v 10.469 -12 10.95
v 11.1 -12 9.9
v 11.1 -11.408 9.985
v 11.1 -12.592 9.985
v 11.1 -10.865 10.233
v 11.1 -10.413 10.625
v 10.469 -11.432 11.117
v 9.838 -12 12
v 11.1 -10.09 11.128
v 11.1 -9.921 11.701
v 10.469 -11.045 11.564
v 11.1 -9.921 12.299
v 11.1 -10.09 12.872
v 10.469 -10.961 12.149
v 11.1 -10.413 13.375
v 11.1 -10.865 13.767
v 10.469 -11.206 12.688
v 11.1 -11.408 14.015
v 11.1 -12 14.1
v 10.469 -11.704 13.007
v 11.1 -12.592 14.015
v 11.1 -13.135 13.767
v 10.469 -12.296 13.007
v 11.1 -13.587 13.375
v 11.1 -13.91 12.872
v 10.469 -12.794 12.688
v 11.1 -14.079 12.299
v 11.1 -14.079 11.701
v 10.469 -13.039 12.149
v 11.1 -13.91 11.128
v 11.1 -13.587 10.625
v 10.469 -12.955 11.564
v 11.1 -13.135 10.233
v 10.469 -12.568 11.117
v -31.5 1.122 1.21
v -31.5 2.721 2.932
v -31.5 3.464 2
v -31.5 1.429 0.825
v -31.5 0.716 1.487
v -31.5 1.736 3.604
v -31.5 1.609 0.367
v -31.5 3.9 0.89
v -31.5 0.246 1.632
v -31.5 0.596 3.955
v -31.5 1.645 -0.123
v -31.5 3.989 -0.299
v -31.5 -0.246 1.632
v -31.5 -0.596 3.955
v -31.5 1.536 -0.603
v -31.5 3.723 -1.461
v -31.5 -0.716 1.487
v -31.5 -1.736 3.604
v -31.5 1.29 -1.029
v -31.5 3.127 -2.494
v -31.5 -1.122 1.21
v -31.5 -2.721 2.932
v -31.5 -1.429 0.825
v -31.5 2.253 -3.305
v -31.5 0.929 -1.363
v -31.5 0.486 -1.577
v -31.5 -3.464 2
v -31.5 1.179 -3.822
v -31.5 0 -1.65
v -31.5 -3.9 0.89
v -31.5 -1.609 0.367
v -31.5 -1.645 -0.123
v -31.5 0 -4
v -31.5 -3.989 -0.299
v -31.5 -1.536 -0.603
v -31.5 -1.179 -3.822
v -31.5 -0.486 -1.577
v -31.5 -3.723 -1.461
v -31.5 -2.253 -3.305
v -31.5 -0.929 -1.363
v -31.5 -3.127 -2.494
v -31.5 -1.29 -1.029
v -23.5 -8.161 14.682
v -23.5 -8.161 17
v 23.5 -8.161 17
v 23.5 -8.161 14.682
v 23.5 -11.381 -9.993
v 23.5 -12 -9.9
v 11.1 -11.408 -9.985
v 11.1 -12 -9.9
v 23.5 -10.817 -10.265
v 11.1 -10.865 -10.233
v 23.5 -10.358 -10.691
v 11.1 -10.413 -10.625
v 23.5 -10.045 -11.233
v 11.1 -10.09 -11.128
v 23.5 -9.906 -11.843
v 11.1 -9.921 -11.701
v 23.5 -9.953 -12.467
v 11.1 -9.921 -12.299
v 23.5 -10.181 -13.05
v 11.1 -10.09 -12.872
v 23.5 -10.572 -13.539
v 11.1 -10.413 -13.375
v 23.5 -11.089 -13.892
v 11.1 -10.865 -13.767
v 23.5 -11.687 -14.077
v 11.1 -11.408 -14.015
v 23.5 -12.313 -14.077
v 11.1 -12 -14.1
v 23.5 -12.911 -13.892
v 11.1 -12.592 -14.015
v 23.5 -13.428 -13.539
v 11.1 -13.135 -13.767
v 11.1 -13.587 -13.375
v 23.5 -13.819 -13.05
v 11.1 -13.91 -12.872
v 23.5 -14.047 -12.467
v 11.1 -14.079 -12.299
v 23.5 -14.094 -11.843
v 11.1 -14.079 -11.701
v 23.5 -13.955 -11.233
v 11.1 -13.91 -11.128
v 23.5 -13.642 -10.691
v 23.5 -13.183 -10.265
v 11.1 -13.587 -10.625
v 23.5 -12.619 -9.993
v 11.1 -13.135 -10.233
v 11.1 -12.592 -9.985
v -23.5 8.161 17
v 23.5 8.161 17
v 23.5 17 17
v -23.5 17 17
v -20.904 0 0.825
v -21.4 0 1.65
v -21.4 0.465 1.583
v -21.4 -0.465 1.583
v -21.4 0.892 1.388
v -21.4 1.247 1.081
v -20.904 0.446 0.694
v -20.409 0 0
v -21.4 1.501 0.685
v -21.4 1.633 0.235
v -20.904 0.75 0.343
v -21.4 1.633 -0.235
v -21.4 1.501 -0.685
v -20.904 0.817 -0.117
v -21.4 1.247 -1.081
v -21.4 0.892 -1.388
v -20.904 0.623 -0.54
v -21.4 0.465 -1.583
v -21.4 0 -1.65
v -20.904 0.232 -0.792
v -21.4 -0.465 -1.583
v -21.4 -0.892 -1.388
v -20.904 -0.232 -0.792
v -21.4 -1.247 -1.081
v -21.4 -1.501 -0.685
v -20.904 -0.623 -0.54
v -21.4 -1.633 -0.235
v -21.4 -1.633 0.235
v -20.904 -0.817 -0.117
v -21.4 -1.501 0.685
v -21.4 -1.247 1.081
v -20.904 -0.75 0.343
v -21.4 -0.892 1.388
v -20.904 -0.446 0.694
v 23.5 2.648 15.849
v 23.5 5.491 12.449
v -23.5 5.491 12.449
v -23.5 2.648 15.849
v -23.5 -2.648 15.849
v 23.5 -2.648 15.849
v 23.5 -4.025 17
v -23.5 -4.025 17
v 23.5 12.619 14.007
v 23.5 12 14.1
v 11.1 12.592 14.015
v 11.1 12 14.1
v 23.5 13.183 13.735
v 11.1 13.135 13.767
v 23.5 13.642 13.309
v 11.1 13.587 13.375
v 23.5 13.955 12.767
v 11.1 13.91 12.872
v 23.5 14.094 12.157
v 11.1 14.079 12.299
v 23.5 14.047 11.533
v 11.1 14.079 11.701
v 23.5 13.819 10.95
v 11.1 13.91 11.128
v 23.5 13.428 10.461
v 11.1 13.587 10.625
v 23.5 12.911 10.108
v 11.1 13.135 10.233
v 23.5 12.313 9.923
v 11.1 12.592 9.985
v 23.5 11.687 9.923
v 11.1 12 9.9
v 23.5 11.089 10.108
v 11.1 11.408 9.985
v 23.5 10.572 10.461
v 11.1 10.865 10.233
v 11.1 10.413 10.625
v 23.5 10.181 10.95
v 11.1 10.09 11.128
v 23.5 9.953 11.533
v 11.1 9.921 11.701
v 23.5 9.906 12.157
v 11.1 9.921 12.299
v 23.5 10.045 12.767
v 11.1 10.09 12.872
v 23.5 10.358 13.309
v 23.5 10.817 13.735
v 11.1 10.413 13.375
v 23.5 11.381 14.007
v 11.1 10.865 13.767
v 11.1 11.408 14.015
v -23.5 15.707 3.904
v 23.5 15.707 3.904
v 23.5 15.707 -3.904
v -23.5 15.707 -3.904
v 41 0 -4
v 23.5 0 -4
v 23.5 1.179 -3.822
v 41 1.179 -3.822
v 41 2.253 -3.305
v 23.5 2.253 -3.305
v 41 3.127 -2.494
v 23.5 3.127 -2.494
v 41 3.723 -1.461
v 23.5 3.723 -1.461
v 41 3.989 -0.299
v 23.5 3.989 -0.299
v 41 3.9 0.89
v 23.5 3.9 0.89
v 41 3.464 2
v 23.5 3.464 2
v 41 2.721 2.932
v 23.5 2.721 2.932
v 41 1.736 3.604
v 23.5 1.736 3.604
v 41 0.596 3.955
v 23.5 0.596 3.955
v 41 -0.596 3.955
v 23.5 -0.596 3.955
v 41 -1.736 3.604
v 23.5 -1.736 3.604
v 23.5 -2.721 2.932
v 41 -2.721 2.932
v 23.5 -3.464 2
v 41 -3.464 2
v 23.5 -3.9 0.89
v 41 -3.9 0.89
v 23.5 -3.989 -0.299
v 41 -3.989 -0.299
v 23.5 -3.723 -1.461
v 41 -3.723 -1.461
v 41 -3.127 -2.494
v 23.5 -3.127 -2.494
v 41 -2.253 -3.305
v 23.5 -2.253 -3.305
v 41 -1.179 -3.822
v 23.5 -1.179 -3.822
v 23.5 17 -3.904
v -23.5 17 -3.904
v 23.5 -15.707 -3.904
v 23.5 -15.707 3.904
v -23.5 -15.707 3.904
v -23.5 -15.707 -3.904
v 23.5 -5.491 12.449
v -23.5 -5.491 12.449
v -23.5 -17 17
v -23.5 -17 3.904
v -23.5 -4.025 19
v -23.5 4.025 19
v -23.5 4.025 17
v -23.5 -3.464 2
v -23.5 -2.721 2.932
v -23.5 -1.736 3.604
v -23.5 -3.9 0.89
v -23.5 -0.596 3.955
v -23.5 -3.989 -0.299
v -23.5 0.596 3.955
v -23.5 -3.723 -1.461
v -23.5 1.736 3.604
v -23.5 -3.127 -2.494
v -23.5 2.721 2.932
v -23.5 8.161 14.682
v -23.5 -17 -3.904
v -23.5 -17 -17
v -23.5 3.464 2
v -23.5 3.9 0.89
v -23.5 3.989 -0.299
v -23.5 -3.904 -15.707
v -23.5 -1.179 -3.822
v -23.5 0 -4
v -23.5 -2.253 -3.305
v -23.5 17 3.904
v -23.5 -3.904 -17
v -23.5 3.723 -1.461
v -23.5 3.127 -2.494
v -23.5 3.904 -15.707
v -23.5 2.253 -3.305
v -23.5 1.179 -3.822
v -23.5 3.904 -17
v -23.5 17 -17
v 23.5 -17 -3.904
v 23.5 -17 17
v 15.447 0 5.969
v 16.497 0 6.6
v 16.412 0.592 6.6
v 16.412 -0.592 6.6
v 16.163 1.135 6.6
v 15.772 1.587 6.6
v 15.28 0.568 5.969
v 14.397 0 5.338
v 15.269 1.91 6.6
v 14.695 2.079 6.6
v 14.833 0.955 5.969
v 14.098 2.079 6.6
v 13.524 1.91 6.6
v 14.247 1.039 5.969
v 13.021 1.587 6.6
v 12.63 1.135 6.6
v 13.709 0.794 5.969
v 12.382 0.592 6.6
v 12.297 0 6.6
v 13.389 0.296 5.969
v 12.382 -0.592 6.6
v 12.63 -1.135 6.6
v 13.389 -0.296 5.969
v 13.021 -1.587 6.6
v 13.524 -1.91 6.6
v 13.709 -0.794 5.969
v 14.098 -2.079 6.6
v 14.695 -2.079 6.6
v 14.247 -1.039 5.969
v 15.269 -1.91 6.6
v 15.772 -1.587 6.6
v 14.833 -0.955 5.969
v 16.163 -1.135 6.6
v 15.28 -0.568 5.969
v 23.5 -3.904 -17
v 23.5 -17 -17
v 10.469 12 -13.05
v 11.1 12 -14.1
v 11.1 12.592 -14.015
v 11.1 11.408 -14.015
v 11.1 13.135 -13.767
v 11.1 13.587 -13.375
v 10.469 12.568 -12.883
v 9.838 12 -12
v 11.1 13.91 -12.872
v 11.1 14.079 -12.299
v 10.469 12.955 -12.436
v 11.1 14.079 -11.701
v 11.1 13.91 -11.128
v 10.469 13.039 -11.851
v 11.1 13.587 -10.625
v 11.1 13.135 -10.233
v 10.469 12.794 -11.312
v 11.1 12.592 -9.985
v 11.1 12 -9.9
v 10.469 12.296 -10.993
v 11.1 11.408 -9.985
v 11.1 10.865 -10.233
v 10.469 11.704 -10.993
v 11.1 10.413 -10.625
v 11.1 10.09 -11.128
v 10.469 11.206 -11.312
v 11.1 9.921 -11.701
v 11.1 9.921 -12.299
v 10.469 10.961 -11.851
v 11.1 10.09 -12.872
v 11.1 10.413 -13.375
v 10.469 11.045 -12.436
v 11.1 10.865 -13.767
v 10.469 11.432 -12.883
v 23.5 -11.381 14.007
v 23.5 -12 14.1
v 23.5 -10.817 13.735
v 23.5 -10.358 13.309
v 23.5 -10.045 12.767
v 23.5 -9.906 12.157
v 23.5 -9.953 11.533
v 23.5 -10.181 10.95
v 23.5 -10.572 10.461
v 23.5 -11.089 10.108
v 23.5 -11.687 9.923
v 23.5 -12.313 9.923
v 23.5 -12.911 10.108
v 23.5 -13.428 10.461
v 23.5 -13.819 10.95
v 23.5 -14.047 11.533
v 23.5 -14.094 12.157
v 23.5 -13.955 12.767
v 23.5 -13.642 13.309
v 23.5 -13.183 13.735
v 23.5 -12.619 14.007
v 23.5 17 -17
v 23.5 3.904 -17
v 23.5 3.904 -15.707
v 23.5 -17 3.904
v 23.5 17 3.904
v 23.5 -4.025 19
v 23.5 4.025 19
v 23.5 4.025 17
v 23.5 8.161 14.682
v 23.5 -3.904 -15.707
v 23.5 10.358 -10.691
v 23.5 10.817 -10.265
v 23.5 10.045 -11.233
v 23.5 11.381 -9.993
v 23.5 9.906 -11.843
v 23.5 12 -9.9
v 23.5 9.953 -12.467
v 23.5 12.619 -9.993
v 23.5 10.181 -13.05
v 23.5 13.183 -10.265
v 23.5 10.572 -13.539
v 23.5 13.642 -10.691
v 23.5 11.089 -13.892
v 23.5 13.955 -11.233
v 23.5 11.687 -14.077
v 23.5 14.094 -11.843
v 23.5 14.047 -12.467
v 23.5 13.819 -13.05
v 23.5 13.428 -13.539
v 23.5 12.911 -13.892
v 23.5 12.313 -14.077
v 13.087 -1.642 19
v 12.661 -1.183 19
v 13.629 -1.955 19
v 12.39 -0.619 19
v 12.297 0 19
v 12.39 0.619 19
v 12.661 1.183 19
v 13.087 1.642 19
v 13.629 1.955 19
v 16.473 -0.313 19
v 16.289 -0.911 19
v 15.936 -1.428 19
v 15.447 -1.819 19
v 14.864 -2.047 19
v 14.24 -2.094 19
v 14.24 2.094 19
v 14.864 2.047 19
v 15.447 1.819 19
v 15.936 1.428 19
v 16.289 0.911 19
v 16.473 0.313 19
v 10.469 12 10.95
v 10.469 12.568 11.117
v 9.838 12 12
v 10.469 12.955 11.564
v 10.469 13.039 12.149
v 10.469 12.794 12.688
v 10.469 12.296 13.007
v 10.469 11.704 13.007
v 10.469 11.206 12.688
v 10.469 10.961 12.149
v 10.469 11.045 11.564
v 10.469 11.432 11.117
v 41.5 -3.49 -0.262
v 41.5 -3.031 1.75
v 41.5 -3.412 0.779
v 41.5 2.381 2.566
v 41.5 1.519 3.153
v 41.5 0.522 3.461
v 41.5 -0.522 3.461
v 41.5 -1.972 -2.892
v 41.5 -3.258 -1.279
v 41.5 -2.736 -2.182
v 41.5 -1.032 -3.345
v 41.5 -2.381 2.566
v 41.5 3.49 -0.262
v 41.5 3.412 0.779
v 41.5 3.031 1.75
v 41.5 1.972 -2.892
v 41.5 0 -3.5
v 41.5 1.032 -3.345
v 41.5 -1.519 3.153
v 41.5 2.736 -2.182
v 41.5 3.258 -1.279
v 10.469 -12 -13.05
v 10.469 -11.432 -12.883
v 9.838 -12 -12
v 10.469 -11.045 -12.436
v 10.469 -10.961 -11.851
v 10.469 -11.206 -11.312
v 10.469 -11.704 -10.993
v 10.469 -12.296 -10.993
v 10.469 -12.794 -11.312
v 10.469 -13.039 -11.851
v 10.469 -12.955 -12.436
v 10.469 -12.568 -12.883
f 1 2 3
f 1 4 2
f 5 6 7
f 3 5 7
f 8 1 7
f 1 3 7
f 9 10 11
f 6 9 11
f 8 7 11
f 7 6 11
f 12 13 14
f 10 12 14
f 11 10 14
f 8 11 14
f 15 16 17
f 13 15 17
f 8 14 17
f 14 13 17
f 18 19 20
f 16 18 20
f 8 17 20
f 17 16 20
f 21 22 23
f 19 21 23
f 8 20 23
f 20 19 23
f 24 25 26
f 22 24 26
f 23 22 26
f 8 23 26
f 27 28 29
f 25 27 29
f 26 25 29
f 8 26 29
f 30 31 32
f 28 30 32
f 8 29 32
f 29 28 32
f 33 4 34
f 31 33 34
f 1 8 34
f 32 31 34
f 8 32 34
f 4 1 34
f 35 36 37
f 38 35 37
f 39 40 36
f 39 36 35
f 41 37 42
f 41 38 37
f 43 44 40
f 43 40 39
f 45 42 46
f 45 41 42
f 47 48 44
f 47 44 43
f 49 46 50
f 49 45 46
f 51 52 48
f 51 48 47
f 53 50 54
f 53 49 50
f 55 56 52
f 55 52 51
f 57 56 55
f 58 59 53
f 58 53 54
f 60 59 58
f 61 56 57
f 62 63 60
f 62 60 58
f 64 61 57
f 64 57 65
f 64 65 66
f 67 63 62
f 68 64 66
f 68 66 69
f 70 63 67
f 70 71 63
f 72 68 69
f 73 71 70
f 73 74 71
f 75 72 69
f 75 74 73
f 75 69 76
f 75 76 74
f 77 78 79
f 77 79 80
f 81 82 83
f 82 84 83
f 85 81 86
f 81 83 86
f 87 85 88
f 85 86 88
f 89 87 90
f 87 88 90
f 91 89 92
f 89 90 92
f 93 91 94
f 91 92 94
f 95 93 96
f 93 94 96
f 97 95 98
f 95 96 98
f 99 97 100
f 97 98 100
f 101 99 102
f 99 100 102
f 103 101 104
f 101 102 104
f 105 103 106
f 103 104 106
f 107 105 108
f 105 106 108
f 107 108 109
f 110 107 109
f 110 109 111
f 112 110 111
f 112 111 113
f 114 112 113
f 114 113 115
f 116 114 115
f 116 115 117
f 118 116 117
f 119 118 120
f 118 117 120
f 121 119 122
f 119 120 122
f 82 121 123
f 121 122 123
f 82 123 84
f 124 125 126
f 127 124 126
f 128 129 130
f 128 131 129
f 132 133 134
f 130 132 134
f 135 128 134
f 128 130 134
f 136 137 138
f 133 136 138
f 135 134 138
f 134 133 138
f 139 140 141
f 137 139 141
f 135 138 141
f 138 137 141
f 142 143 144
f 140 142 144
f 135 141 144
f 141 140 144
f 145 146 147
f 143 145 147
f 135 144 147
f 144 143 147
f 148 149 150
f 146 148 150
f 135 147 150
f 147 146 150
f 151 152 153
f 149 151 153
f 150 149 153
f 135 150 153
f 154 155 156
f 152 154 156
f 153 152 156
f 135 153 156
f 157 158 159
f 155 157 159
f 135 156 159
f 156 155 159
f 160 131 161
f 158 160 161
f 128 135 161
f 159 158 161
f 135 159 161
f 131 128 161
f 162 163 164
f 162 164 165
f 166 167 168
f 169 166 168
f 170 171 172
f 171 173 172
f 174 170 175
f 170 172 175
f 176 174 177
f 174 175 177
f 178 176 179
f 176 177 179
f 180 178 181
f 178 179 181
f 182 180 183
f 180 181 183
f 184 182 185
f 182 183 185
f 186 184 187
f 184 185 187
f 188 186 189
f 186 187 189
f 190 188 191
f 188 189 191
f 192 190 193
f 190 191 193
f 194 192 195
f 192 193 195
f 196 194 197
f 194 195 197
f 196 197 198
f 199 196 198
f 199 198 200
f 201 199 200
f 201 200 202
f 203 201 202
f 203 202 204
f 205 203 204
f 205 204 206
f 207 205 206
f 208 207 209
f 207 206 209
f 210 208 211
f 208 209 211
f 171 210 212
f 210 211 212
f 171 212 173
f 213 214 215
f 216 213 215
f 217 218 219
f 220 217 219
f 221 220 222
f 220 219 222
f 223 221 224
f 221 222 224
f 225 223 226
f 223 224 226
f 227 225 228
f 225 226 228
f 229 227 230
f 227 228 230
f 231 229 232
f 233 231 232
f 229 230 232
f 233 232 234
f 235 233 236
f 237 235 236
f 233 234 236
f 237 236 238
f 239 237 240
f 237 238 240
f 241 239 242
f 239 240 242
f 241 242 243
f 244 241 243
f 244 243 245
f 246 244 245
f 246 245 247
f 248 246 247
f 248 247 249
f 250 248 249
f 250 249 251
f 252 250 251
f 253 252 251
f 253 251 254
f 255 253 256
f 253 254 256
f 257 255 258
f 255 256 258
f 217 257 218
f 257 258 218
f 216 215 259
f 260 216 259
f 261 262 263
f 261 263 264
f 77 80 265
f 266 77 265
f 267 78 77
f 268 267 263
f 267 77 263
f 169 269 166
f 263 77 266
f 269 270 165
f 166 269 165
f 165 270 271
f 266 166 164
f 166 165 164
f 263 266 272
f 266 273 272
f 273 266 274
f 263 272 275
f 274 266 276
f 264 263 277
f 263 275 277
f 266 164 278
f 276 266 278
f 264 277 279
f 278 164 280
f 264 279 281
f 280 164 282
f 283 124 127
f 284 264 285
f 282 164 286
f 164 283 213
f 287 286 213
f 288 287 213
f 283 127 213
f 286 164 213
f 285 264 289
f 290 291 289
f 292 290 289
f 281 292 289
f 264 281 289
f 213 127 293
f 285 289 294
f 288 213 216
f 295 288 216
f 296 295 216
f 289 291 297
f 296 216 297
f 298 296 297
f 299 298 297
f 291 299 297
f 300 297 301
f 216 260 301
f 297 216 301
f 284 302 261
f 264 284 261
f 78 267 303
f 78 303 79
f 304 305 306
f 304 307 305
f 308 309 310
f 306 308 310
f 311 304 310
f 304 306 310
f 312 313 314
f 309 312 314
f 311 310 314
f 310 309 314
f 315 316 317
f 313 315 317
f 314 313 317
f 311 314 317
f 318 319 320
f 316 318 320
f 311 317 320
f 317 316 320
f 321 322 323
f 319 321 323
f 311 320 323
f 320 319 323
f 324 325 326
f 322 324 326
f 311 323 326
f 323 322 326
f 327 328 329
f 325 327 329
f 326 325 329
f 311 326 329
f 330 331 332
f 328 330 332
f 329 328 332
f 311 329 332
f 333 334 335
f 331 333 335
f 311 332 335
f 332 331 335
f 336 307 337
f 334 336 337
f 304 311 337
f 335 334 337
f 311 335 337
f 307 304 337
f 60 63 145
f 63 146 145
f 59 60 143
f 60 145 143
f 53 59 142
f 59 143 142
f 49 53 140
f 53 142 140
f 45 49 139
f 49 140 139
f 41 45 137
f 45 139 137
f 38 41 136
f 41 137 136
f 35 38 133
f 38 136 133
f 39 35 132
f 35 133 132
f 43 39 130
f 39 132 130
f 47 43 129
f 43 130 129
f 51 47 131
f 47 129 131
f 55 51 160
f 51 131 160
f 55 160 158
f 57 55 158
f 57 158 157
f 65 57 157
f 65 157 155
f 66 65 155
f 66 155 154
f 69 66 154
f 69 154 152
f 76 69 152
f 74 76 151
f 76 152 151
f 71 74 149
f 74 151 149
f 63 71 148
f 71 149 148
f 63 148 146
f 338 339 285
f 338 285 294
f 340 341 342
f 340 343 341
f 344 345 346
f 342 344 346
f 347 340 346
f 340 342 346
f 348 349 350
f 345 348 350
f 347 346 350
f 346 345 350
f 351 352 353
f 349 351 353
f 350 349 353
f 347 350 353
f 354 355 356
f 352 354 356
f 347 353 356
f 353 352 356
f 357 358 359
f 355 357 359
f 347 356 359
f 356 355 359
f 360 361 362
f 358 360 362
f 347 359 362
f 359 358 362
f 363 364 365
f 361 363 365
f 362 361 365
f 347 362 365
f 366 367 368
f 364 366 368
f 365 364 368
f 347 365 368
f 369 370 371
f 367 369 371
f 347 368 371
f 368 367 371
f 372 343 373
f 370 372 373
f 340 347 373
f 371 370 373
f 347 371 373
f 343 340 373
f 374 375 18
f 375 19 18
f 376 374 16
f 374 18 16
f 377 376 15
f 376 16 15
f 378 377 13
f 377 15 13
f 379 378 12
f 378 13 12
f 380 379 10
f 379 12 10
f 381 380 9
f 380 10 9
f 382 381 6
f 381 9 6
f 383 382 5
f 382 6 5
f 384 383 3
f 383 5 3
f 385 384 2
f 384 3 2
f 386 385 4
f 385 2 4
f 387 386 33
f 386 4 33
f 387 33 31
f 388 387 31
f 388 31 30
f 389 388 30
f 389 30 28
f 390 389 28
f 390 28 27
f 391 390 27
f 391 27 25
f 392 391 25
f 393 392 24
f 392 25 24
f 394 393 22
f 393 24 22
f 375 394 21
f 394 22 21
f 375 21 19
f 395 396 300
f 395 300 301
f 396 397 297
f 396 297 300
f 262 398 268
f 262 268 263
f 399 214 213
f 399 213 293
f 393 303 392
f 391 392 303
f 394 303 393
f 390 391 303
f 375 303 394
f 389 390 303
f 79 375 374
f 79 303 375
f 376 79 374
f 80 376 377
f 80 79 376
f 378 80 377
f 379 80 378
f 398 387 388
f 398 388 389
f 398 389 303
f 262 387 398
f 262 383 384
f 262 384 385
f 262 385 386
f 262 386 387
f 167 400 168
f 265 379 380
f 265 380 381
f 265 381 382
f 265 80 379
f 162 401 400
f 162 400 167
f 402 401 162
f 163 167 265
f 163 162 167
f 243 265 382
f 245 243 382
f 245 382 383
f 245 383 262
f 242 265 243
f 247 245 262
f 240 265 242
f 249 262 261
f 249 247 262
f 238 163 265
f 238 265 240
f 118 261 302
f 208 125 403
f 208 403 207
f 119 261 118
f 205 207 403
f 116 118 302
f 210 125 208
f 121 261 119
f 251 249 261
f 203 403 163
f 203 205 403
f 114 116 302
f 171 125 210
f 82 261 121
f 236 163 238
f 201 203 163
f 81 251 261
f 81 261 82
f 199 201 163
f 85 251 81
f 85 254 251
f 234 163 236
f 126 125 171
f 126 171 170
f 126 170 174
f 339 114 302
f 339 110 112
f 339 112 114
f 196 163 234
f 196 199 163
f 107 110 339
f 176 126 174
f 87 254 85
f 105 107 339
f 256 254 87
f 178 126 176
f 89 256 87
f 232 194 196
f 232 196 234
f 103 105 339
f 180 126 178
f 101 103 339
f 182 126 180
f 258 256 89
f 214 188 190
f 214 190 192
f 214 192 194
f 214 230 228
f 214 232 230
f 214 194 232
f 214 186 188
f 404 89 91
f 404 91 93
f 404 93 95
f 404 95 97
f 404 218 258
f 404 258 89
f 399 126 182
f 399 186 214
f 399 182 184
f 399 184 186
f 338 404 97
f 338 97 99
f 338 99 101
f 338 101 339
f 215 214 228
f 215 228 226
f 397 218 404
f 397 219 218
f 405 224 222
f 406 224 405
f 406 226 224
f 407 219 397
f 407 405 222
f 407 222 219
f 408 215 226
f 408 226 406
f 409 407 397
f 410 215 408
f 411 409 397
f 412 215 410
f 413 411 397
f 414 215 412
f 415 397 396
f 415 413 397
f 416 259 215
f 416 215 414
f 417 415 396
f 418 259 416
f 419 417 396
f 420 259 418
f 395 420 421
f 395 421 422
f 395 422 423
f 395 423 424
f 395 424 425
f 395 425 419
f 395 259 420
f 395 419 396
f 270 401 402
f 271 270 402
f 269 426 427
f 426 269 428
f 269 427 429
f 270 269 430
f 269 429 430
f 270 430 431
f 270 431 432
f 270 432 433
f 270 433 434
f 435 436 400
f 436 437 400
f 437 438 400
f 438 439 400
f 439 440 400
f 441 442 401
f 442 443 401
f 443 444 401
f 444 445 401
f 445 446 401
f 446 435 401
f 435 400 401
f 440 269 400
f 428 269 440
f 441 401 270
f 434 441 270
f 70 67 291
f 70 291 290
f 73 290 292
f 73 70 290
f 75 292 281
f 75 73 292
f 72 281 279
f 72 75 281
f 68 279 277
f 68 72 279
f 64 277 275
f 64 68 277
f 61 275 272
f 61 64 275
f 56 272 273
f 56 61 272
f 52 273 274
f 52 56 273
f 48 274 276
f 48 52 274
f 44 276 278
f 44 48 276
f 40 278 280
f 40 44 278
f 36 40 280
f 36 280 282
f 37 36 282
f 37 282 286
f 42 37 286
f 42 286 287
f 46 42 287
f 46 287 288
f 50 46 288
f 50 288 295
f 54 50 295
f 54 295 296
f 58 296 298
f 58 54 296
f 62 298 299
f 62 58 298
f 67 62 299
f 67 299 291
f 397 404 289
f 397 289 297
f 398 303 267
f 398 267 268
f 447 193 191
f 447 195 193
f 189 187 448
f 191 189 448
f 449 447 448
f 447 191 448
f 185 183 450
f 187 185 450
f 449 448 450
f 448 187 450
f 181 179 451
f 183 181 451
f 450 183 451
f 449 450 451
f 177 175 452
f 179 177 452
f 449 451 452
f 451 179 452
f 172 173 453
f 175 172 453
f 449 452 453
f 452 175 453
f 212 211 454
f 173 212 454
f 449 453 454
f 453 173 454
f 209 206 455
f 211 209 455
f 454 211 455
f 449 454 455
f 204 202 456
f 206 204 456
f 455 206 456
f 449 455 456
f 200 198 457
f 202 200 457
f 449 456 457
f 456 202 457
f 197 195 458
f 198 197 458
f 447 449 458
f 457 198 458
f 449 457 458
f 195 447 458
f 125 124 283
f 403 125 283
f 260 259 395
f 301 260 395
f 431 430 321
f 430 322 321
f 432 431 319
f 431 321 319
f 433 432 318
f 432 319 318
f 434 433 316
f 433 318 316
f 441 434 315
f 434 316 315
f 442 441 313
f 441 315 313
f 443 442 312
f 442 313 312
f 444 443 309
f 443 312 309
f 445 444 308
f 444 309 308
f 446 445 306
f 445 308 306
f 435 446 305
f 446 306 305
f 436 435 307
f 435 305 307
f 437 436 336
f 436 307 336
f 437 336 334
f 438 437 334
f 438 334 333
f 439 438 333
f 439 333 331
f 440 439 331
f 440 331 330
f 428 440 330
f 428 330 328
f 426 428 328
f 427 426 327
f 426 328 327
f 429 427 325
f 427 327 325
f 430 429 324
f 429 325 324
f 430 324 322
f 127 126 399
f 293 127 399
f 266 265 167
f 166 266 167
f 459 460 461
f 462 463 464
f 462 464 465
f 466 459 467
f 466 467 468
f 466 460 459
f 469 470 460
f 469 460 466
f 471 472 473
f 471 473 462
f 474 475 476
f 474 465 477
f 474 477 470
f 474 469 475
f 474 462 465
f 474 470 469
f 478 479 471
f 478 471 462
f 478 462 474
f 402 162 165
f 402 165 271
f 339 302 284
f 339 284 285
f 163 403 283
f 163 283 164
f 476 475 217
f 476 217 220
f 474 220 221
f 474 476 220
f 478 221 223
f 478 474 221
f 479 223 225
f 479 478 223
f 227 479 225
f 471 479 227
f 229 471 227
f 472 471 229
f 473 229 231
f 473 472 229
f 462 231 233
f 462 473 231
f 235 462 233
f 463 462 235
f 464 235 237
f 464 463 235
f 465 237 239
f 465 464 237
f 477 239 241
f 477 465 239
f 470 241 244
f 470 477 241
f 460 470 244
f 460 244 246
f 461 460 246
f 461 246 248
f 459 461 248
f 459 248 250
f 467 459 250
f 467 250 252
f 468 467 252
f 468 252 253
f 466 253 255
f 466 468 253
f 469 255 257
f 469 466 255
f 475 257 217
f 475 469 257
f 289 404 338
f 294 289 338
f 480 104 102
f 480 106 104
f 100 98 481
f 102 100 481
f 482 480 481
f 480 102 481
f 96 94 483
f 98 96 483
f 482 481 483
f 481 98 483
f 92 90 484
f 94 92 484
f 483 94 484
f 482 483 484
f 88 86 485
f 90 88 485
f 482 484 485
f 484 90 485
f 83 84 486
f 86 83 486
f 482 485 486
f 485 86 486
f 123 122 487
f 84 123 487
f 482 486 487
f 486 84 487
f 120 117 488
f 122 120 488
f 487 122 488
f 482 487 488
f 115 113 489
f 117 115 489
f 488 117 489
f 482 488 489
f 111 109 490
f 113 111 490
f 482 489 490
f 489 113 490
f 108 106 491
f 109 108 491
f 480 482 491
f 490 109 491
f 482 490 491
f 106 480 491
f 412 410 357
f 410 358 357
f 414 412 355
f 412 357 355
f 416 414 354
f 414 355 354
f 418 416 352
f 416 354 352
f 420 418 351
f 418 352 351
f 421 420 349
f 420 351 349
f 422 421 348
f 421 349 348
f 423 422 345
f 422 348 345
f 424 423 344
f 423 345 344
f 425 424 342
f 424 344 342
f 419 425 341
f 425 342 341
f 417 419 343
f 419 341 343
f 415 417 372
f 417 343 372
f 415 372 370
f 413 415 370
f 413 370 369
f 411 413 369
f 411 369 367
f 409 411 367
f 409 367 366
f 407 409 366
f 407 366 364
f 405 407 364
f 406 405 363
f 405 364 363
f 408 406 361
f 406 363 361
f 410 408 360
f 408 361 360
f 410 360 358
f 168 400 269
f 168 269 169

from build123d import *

# Parameters (mm, degrees)
SKETCH_1_W          = 34
SKETCH_1_H          = 34
EXTRUDE_1_DEPTH     = 23.5
SKETCH_2_W          = 7.807367758
SKETCH_2_H          = 1.293413098
SKETCH_2_W_2        = 1.293413098
SKETCH_2_H_2        = 7.807367758
CUT_EXTRUDE_1_DEPTH = 53.792044855
CUT_EXTRUDE_2_DEPTH = 53.792044855
SKETCH_4_W          = 2
SKETCH_4_H          = 8.049048512
EXTRUDE_2_DEPTH     = 47
M5X0_8_1_D          = 4.2
M5X0_8_1_DEPTH      = 12.4
M5X0_8_1_TIP        = 1.2618073
SKETCH_7_R          = 4
EXTRUDE_3_DEPTH     = 18
EXTRUDE_START       = 8
SKETCH_8_R          = 4
EXTRUDE_4_DEPTH     = 8
M4X0_7_1_D          = 3.3
M4X0_7_1_DEPTH      = 10.1
M4X0_7_1_TIP        = 0.991420021
M5X0_8_2_D          = 4.2
M5X0_8_2_DEPTH      = 12.4
M5X0_8_2_TIP        = 1.2618073
CHAMFER_1_SIZE      = 0.5


with BuildPart() as part:
    # 草图1 → 凸台-拉伸1 (new, symmetric)
    with BuildSketch(Plane(origin=(0, 0, 0), x_dir=(0, 0, -1), z_dir=(1, 0, 0))):
        Rectangle(SKETCH_1_W, SKETCH_1_H)
    extrude(amount=EXTRUDE_1_DEPTH, both=True)

    # 草图2 → 切除-拉伸1 (cut, through all)
    with BuildSketch(Plane(origin=(23.5, 0, 0), x_dir=(0, 0, -1), z_dir=(1, 0, 0))):
        with Locations((0, 16.353293451)):
            Rectangle(SKETCH_2_W, SKETCH_2_H)
        with Locations((0, -16.353293451)):
            Rectangle(SKETCH_2_W, SKETCH_2_H)
        with Locations((16.353293451, 0)):
            Rectangle(SKETCH_2_W_2, SKETCH_2_H_2)
    extrude(amount=-CUT_EXTRUDE_1_DEPTH, mode=Mode.SUBTRACT)

    # 草图3 → 切除-拉伸2 (cut, through all)
    with BuildSketch(Plane(origin=(23.5, 0, 0), x_dir=(0, 0, -1), z_dir=(1, 0, 0))):
        Polygon((-17, 8.160891433), (-14.681905921, 8.160891433), (-12.449444795, 5.490864716), (-15.849248052, 2.648223271), (-17, 4.024524256), align=None)
        Polygon((-17, -4.024524256), (-17, -8.160891433), (-14.681905921, -8.160891433), (-12.449444795, -5.490864716), (-15.849248052, -2.648223271), align=None)
    extrude(amount=-CUT_EXTRUDE_2_DEPTH, mode=Mode.SUBTRACT)

    # 草图4 → 凸台-拉伸2 (add)
    with BuildSketch(Plane(origin=(23.5, 0, 0), x_dir=(0, 0, -1), z_dir=(1, 0, 0))):
        with Locations((-18, 0)):
            Rectangle(SKETCH_4_W, SKETCH_4_H)
    extrude(amount=-EXTRUDE_2_DEPTH)

    # M5x0.8 螺纹孔1
    with Locations(Plane.XY.offset(19)):
        with Locations((14.396569206, 0)):
            Hole(M5X0_8_1_D / 2, depth=M5X0_8_1_DEPTH)
            with Locations((0, 0, -(M5X0_8_1_DEPTH + M5X0_8_1_TIP / 2))):  # 118° drill point
                Cone(0, M5X0_8_1_D / 2, M5X0_8_1_TIP, mode=Mode.SUBTRACT)

    # 草图7 → 凸台-拉伸3 (add)
    with BuildSketch(Plane(origin=(23.5, 0, 0), x_dir=(0, 0, -1), z_dir=(1, 0, 0))):
        Circle(SKETCH_7_R)
    extrude(amount=EXTRUDE_3_DEPTH)

    # 草图8 → 凸台-拉伸4 (add)
    with BuildSketch(Plane.ZY.offset(23.5).offset(EXTRUDE_START)):
        with Locations(Location((0, 0, 0), (0, 0, 180))):
            Circle(SKETCH_8_R)
    extrude(amount=-EXTRUDE_4_DEPTH)

    # M4x0.7 螺纹孔1
    with Locations(Plane.ZY.offset(31.5)):
        with Locations((0, 0)):
            Hole(M4X0_7_1_D / 2, depth=M4X0_7_1_DEPTH)
            with Locations((0, 0, -(M4X0_7_1_DEPTH + M4X0_7_1_TIP / 2))):  # 118° drill point
                Cone(0, M4X0_7_1_D / 2, M4X0_7_1_TIP, mode=Mode.SUBTRACT)

    # M5x0.8 螺纹孔2
    with Locations(Plane(origin=(23.5, 0, 0), x_dir=(0, 0, -1), z_dir=(1, 0, 0))):
        with Locations((-12, 12), (12, 12), (12, -12), (-12, -12)):
            Hole(M5X0_8_2_D / 2, depth=M5X0_8_2_DEPTH)
            with Locations((0, 0, -(M5X0_8_2_DEPTH + M5X0_8_2_TIP / 2))):  # 118° drill point
                Cone(0, M5X0_8_2_D / 2, M5X0_8_2_TIP, mode=Mode.SUBTRACT)

    # 倒角1
    chamfer_1_edges = [part.edges().sort_by_distance(p)[0] for p in [
        (41.5, 0, 4),
    ]]
    chamfer(chamfer_1_edges, length=CHAMFER_1_SIZE)


solid = part.part
